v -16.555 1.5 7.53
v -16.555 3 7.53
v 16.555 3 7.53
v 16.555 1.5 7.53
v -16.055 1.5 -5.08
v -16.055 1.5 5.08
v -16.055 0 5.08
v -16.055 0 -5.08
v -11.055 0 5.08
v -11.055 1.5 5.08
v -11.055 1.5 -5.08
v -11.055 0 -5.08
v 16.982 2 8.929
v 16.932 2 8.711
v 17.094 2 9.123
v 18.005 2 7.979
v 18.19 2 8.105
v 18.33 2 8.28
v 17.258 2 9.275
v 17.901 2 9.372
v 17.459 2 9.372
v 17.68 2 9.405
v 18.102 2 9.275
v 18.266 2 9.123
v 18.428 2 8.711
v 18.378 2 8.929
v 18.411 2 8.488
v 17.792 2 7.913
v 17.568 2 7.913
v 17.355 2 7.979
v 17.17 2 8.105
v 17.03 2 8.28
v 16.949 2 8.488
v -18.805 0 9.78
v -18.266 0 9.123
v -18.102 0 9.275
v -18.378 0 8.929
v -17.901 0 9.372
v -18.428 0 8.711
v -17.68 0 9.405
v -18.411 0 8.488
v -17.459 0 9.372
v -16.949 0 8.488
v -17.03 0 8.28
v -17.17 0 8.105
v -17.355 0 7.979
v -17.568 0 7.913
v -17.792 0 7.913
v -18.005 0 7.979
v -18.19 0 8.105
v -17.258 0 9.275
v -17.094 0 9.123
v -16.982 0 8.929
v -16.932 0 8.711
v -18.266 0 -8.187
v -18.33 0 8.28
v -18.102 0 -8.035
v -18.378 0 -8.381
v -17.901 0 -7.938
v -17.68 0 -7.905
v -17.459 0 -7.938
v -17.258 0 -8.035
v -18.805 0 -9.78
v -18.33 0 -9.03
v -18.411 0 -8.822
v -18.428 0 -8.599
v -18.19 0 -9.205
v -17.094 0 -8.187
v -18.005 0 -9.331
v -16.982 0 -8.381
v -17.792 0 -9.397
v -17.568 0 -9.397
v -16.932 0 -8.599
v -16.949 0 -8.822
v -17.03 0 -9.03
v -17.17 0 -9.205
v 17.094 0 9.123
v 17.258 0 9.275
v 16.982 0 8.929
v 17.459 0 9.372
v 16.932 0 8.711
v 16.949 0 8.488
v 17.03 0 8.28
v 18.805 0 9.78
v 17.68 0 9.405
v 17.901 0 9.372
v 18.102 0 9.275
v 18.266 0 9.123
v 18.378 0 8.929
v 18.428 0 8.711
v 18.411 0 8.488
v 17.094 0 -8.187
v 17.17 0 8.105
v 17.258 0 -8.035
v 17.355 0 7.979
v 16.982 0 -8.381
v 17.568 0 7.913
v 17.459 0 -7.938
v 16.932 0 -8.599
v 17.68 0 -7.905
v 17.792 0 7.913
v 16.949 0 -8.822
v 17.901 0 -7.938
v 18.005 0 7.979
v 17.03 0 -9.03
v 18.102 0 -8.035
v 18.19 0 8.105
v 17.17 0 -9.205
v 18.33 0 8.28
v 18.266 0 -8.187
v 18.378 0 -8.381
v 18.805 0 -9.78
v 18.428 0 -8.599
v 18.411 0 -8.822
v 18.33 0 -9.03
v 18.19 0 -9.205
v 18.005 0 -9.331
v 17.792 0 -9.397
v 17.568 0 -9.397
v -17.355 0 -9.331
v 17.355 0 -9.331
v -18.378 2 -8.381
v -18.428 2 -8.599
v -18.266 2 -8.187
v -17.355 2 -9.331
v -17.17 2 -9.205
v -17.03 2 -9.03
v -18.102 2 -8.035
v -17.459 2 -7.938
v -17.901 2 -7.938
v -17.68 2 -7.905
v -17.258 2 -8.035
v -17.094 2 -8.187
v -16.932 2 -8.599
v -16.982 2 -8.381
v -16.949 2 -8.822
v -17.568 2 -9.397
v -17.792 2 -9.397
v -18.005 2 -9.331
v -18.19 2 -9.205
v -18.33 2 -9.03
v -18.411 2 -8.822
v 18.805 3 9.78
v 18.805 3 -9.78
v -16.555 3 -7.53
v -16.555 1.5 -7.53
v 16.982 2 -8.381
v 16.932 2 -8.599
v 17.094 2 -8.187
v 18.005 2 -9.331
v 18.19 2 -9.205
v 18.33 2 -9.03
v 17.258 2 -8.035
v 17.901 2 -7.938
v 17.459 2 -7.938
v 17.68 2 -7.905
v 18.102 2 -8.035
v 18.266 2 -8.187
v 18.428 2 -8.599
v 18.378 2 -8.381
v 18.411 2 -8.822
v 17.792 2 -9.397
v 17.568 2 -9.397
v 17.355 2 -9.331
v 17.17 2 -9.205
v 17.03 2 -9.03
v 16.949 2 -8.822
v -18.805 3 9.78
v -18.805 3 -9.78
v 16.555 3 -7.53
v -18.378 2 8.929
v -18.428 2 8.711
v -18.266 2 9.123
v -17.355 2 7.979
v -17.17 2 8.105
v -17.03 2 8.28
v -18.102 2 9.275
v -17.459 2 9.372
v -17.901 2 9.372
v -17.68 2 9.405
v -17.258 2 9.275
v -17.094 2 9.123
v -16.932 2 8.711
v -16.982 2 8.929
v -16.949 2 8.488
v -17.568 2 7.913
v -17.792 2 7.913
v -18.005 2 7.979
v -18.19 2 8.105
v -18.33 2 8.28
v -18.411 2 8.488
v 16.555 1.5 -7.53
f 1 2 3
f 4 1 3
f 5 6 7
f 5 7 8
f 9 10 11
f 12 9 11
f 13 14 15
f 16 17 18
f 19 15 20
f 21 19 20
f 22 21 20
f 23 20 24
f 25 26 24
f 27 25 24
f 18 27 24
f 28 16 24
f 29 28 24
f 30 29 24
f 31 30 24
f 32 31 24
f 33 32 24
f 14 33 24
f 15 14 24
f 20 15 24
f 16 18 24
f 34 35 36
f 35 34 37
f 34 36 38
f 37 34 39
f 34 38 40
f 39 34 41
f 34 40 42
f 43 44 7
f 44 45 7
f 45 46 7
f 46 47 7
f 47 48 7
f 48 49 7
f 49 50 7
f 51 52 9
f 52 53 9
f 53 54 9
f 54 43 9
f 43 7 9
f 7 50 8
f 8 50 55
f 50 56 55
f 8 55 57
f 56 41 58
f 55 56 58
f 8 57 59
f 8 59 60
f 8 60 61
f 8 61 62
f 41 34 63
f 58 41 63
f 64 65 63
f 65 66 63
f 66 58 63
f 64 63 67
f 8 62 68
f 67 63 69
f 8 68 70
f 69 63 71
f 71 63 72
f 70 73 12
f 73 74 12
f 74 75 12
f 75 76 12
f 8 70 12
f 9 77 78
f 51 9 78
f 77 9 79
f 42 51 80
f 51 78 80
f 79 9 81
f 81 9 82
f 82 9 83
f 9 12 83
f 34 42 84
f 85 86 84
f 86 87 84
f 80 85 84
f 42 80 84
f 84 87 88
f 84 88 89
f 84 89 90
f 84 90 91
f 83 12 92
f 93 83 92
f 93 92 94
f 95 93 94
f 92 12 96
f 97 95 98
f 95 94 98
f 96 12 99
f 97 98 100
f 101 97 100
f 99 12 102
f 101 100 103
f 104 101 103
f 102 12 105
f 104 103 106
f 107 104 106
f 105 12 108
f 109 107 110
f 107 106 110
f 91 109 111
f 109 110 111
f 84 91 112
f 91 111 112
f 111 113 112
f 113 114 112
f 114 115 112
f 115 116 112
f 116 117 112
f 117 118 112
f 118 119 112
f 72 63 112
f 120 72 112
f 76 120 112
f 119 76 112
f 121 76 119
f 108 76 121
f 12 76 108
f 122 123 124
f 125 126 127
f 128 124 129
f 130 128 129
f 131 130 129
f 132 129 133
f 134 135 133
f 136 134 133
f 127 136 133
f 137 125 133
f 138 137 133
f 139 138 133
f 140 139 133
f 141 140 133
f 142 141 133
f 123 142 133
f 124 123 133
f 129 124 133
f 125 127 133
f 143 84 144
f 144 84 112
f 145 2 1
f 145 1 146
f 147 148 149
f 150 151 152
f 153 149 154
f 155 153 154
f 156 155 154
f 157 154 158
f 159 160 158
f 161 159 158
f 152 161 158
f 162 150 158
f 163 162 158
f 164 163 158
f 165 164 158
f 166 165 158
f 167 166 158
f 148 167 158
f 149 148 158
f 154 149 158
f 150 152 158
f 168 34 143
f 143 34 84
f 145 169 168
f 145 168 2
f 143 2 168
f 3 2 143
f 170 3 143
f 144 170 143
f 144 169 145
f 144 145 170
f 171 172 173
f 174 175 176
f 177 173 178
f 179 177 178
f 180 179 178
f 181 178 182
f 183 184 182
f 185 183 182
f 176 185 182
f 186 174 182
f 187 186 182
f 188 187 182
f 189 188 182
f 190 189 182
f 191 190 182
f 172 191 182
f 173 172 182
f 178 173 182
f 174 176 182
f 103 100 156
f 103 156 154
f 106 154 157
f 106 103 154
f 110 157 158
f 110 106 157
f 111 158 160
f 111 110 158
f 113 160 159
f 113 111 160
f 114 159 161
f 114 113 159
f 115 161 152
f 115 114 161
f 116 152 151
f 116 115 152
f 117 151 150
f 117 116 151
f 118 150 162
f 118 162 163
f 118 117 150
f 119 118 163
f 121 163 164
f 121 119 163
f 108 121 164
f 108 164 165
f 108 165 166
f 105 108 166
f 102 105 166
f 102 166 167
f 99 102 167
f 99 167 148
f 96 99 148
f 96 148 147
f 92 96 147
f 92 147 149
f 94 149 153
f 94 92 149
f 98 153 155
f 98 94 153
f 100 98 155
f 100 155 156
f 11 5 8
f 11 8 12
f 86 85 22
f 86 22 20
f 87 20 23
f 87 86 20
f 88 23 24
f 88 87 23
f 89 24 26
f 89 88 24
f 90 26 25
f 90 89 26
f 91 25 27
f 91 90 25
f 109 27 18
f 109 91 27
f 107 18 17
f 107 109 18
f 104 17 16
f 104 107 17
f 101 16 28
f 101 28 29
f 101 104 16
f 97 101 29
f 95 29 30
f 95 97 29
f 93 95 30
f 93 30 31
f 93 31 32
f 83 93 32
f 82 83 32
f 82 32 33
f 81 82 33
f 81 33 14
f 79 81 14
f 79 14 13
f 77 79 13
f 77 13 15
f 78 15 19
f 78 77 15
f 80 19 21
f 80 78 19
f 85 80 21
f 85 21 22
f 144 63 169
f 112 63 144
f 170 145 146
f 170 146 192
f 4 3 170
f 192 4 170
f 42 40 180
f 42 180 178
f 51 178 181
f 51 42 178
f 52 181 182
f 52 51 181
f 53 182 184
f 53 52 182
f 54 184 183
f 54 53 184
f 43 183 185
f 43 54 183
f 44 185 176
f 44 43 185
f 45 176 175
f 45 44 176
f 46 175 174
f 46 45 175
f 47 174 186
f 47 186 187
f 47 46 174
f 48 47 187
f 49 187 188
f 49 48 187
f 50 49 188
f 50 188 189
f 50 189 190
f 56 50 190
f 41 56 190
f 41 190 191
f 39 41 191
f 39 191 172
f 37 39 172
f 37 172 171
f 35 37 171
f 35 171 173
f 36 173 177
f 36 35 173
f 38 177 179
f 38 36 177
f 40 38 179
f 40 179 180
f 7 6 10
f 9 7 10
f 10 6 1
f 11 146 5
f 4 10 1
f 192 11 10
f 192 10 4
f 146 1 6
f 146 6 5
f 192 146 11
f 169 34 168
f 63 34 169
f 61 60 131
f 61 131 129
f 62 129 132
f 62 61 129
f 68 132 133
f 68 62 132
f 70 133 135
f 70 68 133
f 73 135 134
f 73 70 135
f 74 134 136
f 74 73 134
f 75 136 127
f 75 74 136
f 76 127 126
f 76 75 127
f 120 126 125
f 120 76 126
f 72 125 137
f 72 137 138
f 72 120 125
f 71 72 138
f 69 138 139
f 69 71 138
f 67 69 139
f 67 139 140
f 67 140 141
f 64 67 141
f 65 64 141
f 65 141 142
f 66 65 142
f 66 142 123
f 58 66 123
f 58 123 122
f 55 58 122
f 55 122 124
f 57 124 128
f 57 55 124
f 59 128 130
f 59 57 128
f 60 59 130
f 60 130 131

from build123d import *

# Parameters (mm, degrees)
ESBO_O1_W                = 37.61
ESBO_O1_H                = 19.56
BASE_DEPTH               = 3
ESPA_O_START             = 3
ESBO_O4_W                = 33.11
ESBO_O4_H                = 15.06
ESPA_O_SENSOR_DEPTH      = 1.5
RECORTE_START            = 1.5
ESBO_O5_W                = 5
ESBO_O5_H                = 10.16
RECORTE_CONECTORES_DEPTH = 23.907391831
ESBO_O6_R                = 0.75
CORTE_EXTRUS_O3_DEPTH    = 2


with BuildPart() as part:
    # Esboço1 → Base (new body)
    with BuildSketch(Plane(origin=(0, 0, 0), x_dir=(1, 0, 0), z_dir=(0, 1, 0))):
        Rectangle(ESBO_O1_W, ESBO_O1_H)
    extrude(amount=BASE_DEPTH)

    # Esboço4 → Espaço Sensor (cut)
    with BuildSketch(Plane(origin=(0, 0, 0), x_dir=(1, 0, 0), z_dir=(0, 1, 0)).offset(ESPA_O_START)):
        Rectangle(ESBO_O4_W, ESBO_O4_H)
    extrude(amount=-ESPA_O_SENSOR_DEPTH, mode=Mode.SUBTRACT)

    # Esboço5 → Recorte Conectores (cut, through all)
    with BuildSketch(Plane(origin=(0, 0, 0), x_dir=(1, 0, 0), z_dir=(0, 1, 0)).offset(RECORTE_START)):
        with Locations((-13.555, 0)):
            Rectangle(ESBO_O5_W, ESBO_O5_H)
    extrude(amount=-RECORTE_CONECTORES_DEPTH, mode=Mode.SUBTRACT)

    # Esboço6 → Corte-extrusão3 (cut)
    with BuildSketch(Plane(origin=(0, 0, 0), x_dir=(1, 0, 0), z_dir=(0, 1, 0))):
        with Locations(Location((-17.68, -8.655, 0), (0, 0, 270))):
            Circle(ESBO_O6_R)
        with Locations(Location((17.68, -8.655, 0), (0, 0, 270))):
            Circle(ESBO_O6_R)
        with Locations(Location((17.68, 8.655, 0), (0, 0, 270))):
            Circle(ESBO_O6_R)
        with Locations(Location((-17.68, 8.655, 0), (0, 0, 270))):
            Circle(ESBO_O6_R)
    extrude(amount=CORTE_EXTRUS_O3_DEPTH, mode=Mode.SUBTRACT)


solid = part.part
